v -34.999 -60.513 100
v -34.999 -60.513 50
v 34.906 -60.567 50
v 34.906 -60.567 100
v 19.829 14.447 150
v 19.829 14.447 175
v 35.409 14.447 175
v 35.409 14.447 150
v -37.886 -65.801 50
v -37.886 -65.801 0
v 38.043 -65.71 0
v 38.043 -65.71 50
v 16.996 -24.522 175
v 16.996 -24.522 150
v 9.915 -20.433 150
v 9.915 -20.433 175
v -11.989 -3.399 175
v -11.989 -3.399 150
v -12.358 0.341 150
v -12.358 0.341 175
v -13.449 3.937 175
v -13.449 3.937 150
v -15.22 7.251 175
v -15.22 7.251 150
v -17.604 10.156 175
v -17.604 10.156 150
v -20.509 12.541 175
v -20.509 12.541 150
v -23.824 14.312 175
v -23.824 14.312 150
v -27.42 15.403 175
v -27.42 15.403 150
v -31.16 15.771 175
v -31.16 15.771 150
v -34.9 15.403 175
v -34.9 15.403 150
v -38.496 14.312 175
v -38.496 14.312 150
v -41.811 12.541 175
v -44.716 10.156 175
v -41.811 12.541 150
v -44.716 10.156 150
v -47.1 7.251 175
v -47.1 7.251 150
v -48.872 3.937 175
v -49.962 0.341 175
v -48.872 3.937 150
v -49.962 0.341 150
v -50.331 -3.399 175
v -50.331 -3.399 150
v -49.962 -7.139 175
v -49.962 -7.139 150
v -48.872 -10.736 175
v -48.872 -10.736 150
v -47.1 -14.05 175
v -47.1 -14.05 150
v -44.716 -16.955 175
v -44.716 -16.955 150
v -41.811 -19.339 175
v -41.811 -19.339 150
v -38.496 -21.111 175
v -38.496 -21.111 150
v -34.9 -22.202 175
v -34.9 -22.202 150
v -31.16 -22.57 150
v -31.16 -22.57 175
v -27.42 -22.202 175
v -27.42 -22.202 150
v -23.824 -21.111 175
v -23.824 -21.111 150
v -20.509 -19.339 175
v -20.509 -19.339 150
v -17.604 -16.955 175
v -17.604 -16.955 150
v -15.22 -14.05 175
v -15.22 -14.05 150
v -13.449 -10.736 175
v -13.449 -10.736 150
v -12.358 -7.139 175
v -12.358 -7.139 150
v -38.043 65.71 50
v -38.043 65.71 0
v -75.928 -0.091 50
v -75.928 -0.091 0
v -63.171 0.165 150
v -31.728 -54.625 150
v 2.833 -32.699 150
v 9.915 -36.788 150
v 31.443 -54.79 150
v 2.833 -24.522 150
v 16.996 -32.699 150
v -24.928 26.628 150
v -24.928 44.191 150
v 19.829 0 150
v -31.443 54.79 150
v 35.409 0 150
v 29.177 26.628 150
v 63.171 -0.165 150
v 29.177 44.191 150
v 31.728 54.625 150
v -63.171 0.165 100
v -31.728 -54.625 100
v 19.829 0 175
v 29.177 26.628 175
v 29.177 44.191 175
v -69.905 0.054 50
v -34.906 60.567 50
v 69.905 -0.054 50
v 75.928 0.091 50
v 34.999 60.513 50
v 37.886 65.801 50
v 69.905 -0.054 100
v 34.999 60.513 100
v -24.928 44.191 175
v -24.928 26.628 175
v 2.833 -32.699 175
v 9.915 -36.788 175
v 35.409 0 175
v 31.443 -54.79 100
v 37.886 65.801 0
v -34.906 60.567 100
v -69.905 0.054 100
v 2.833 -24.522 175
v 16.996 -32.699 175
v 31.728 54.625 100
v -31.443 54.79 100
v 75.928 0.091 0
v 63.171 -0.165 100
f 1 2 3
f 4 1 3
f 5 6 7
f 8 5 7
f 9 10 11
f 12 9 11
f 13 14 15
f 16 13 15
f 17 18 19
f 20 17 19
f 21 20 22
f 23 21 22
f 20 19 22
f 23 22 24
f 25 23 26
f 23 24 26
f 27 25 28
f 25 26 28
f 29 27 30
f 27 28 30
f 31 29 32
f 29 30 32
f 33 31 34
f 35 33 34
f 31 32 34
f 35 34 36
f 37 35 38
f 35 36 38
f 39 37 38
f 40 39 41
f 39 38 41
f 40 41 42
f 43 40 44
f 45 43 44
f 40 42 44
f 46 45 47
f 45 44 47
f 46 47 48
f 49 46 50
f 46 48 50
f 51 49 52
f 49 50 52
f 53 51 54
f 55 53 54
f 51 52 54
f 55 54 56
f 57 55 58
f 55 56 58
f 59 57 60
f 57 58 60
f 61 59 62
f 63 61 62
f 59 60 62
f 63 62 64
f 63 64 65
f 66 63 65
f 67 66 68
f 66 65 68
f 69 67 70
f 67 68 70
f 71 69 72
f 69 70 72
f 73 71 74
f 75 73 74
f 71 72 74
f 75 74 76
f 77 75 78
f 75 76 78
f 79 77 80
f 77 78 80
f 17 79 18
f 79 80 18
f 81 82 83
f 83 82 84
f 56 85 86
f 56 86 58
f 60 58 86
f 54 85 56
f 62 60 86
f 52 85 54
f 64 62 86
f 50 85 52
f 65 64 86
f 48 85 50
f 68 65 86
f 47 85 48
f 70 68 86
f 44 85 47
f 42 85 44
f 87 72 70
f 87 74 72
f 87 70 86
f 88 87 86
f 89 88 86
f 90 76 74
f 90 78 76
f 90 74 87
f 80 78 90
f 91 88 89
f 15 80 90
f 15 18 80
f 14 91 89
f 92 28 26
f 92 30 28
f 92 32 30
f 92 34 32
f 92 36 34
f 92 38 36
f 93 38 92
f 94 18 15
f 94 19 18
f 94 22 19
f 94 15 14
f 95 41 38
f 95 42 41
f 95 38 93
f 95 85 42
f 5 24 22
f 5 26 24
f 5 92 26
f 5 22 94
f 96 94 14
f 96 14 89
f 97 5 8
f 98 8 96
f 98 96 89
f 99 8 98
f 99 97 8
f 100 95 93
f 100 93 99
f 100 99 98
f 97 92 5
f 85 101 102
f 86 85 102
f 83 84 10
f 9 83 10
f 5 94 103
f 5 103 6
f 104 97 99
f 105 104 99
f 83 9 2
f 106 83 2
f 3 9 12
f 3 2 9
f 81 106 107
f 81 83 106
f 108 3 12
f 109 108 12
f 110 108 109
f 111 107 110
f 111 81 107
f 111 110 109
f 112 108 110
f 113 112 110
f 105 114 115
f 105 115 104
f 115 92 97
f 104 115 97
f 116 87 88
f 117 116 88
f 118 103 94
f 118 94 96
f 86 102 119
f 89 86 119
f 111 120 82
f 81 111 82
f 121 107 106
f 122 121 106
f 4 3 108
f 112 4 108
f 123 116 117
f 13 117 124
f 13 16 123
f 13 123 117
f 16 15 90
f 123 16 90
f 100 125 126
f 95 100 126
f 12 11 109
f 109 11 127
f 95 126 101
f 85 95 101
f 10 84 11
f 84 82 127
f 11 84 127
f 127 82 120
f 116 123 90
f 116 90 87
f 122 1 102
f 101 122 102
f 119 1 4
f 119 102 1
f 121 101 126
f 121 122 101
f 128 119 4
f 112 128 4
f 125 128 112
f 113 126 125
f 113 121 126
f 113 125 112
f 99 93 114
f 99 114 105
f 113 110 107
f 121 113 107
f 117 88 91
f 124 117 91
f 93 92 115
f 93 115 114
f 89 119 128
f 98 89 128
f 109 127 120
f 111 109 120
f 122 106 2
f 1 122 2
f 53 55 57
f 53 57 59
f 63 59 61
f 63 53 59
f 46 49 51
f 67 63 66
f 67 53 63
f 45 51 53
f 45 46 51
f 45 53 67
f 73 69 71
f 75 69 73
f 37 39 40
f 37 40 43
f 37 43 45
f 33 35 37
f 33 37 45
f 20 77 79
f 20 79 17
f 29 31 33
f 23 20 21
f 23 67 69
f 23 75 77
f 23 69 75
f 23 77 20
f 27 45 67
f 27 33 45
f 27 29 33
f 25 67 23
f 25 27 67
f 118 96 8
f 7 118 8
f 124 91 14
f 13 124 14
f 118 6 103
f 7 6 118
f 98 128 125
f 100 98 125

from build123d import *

# Parameters (mm, degrees)
F1_DEPTH = 50
F3_DEPTH = 50
F5_DEPTH = 50
F6_W     = 54.105216
F6_H     = 17.56295
F6_R     = 19.170726
F6_W_2   = 15.580038
F6_H_2   = 14.446942
F7_DEPTH = 25


with BuildPart() as f1:
    # F0 (on Top) → F1 (new body)
    with BuildSketch(Plane.XY):
        Polygon((-38.042759, 65.710473), (-75.928318, -0.090759), (-37.88556, -65.801232), (38.042759, -65.710473), (75.928318, 0.090759), (37.88556, 65.801232), align=None)
    extrude(amount=F1_DEPTH)

    # F2 (on face) → F3 (join)
    with BuildSketch(Plane.XY.offset(50)):
        Polygon((-34.905945, 60.566627), (-69.90521, 0.053879), (-34.999265, -60.512748), (34.905945, -60.566627), (69.90521, -0.053879), (34.999265, 60.512748), align=None)
    extrude(amount=F3_DEPTH)

    # F4 (on face) → F5 (join)
    with BuildSketch(Plane.XY.offset(100)):
        Polygon((-31.442505, 54.790029), (-63.170809, 0.165007), (-31.728305, -54.625022), (31.442505, -54.790029), (63.170809, -0.165007), (31.728305, 54.625022), align=None)
    extrude(amount=F5_DEPTH)

    # F6 (on face) → F7 (join)
    with BuildSketch(Plane.XY.offset(150)):
        with Locations((2.124549, 35.409174)):
            Rectangle(F6_W, F6_H)
        with Locations((-31.160073, -3.399281)):
            Circle(F6_R)
        with Locations((27.619156, 7.223471)):
            Rectangle(F6_W_2, F6_H_2)
        Polygon((2.832735, -24.521915), (2.832735, -32.699312), (9.914569, -36.78801), (16.996402, -32.699312), (16.996402, -24.521915), (9.914569, -20.433216), align=None)
    extrude(amount=F7_DEPTH)


solid = f1.part
